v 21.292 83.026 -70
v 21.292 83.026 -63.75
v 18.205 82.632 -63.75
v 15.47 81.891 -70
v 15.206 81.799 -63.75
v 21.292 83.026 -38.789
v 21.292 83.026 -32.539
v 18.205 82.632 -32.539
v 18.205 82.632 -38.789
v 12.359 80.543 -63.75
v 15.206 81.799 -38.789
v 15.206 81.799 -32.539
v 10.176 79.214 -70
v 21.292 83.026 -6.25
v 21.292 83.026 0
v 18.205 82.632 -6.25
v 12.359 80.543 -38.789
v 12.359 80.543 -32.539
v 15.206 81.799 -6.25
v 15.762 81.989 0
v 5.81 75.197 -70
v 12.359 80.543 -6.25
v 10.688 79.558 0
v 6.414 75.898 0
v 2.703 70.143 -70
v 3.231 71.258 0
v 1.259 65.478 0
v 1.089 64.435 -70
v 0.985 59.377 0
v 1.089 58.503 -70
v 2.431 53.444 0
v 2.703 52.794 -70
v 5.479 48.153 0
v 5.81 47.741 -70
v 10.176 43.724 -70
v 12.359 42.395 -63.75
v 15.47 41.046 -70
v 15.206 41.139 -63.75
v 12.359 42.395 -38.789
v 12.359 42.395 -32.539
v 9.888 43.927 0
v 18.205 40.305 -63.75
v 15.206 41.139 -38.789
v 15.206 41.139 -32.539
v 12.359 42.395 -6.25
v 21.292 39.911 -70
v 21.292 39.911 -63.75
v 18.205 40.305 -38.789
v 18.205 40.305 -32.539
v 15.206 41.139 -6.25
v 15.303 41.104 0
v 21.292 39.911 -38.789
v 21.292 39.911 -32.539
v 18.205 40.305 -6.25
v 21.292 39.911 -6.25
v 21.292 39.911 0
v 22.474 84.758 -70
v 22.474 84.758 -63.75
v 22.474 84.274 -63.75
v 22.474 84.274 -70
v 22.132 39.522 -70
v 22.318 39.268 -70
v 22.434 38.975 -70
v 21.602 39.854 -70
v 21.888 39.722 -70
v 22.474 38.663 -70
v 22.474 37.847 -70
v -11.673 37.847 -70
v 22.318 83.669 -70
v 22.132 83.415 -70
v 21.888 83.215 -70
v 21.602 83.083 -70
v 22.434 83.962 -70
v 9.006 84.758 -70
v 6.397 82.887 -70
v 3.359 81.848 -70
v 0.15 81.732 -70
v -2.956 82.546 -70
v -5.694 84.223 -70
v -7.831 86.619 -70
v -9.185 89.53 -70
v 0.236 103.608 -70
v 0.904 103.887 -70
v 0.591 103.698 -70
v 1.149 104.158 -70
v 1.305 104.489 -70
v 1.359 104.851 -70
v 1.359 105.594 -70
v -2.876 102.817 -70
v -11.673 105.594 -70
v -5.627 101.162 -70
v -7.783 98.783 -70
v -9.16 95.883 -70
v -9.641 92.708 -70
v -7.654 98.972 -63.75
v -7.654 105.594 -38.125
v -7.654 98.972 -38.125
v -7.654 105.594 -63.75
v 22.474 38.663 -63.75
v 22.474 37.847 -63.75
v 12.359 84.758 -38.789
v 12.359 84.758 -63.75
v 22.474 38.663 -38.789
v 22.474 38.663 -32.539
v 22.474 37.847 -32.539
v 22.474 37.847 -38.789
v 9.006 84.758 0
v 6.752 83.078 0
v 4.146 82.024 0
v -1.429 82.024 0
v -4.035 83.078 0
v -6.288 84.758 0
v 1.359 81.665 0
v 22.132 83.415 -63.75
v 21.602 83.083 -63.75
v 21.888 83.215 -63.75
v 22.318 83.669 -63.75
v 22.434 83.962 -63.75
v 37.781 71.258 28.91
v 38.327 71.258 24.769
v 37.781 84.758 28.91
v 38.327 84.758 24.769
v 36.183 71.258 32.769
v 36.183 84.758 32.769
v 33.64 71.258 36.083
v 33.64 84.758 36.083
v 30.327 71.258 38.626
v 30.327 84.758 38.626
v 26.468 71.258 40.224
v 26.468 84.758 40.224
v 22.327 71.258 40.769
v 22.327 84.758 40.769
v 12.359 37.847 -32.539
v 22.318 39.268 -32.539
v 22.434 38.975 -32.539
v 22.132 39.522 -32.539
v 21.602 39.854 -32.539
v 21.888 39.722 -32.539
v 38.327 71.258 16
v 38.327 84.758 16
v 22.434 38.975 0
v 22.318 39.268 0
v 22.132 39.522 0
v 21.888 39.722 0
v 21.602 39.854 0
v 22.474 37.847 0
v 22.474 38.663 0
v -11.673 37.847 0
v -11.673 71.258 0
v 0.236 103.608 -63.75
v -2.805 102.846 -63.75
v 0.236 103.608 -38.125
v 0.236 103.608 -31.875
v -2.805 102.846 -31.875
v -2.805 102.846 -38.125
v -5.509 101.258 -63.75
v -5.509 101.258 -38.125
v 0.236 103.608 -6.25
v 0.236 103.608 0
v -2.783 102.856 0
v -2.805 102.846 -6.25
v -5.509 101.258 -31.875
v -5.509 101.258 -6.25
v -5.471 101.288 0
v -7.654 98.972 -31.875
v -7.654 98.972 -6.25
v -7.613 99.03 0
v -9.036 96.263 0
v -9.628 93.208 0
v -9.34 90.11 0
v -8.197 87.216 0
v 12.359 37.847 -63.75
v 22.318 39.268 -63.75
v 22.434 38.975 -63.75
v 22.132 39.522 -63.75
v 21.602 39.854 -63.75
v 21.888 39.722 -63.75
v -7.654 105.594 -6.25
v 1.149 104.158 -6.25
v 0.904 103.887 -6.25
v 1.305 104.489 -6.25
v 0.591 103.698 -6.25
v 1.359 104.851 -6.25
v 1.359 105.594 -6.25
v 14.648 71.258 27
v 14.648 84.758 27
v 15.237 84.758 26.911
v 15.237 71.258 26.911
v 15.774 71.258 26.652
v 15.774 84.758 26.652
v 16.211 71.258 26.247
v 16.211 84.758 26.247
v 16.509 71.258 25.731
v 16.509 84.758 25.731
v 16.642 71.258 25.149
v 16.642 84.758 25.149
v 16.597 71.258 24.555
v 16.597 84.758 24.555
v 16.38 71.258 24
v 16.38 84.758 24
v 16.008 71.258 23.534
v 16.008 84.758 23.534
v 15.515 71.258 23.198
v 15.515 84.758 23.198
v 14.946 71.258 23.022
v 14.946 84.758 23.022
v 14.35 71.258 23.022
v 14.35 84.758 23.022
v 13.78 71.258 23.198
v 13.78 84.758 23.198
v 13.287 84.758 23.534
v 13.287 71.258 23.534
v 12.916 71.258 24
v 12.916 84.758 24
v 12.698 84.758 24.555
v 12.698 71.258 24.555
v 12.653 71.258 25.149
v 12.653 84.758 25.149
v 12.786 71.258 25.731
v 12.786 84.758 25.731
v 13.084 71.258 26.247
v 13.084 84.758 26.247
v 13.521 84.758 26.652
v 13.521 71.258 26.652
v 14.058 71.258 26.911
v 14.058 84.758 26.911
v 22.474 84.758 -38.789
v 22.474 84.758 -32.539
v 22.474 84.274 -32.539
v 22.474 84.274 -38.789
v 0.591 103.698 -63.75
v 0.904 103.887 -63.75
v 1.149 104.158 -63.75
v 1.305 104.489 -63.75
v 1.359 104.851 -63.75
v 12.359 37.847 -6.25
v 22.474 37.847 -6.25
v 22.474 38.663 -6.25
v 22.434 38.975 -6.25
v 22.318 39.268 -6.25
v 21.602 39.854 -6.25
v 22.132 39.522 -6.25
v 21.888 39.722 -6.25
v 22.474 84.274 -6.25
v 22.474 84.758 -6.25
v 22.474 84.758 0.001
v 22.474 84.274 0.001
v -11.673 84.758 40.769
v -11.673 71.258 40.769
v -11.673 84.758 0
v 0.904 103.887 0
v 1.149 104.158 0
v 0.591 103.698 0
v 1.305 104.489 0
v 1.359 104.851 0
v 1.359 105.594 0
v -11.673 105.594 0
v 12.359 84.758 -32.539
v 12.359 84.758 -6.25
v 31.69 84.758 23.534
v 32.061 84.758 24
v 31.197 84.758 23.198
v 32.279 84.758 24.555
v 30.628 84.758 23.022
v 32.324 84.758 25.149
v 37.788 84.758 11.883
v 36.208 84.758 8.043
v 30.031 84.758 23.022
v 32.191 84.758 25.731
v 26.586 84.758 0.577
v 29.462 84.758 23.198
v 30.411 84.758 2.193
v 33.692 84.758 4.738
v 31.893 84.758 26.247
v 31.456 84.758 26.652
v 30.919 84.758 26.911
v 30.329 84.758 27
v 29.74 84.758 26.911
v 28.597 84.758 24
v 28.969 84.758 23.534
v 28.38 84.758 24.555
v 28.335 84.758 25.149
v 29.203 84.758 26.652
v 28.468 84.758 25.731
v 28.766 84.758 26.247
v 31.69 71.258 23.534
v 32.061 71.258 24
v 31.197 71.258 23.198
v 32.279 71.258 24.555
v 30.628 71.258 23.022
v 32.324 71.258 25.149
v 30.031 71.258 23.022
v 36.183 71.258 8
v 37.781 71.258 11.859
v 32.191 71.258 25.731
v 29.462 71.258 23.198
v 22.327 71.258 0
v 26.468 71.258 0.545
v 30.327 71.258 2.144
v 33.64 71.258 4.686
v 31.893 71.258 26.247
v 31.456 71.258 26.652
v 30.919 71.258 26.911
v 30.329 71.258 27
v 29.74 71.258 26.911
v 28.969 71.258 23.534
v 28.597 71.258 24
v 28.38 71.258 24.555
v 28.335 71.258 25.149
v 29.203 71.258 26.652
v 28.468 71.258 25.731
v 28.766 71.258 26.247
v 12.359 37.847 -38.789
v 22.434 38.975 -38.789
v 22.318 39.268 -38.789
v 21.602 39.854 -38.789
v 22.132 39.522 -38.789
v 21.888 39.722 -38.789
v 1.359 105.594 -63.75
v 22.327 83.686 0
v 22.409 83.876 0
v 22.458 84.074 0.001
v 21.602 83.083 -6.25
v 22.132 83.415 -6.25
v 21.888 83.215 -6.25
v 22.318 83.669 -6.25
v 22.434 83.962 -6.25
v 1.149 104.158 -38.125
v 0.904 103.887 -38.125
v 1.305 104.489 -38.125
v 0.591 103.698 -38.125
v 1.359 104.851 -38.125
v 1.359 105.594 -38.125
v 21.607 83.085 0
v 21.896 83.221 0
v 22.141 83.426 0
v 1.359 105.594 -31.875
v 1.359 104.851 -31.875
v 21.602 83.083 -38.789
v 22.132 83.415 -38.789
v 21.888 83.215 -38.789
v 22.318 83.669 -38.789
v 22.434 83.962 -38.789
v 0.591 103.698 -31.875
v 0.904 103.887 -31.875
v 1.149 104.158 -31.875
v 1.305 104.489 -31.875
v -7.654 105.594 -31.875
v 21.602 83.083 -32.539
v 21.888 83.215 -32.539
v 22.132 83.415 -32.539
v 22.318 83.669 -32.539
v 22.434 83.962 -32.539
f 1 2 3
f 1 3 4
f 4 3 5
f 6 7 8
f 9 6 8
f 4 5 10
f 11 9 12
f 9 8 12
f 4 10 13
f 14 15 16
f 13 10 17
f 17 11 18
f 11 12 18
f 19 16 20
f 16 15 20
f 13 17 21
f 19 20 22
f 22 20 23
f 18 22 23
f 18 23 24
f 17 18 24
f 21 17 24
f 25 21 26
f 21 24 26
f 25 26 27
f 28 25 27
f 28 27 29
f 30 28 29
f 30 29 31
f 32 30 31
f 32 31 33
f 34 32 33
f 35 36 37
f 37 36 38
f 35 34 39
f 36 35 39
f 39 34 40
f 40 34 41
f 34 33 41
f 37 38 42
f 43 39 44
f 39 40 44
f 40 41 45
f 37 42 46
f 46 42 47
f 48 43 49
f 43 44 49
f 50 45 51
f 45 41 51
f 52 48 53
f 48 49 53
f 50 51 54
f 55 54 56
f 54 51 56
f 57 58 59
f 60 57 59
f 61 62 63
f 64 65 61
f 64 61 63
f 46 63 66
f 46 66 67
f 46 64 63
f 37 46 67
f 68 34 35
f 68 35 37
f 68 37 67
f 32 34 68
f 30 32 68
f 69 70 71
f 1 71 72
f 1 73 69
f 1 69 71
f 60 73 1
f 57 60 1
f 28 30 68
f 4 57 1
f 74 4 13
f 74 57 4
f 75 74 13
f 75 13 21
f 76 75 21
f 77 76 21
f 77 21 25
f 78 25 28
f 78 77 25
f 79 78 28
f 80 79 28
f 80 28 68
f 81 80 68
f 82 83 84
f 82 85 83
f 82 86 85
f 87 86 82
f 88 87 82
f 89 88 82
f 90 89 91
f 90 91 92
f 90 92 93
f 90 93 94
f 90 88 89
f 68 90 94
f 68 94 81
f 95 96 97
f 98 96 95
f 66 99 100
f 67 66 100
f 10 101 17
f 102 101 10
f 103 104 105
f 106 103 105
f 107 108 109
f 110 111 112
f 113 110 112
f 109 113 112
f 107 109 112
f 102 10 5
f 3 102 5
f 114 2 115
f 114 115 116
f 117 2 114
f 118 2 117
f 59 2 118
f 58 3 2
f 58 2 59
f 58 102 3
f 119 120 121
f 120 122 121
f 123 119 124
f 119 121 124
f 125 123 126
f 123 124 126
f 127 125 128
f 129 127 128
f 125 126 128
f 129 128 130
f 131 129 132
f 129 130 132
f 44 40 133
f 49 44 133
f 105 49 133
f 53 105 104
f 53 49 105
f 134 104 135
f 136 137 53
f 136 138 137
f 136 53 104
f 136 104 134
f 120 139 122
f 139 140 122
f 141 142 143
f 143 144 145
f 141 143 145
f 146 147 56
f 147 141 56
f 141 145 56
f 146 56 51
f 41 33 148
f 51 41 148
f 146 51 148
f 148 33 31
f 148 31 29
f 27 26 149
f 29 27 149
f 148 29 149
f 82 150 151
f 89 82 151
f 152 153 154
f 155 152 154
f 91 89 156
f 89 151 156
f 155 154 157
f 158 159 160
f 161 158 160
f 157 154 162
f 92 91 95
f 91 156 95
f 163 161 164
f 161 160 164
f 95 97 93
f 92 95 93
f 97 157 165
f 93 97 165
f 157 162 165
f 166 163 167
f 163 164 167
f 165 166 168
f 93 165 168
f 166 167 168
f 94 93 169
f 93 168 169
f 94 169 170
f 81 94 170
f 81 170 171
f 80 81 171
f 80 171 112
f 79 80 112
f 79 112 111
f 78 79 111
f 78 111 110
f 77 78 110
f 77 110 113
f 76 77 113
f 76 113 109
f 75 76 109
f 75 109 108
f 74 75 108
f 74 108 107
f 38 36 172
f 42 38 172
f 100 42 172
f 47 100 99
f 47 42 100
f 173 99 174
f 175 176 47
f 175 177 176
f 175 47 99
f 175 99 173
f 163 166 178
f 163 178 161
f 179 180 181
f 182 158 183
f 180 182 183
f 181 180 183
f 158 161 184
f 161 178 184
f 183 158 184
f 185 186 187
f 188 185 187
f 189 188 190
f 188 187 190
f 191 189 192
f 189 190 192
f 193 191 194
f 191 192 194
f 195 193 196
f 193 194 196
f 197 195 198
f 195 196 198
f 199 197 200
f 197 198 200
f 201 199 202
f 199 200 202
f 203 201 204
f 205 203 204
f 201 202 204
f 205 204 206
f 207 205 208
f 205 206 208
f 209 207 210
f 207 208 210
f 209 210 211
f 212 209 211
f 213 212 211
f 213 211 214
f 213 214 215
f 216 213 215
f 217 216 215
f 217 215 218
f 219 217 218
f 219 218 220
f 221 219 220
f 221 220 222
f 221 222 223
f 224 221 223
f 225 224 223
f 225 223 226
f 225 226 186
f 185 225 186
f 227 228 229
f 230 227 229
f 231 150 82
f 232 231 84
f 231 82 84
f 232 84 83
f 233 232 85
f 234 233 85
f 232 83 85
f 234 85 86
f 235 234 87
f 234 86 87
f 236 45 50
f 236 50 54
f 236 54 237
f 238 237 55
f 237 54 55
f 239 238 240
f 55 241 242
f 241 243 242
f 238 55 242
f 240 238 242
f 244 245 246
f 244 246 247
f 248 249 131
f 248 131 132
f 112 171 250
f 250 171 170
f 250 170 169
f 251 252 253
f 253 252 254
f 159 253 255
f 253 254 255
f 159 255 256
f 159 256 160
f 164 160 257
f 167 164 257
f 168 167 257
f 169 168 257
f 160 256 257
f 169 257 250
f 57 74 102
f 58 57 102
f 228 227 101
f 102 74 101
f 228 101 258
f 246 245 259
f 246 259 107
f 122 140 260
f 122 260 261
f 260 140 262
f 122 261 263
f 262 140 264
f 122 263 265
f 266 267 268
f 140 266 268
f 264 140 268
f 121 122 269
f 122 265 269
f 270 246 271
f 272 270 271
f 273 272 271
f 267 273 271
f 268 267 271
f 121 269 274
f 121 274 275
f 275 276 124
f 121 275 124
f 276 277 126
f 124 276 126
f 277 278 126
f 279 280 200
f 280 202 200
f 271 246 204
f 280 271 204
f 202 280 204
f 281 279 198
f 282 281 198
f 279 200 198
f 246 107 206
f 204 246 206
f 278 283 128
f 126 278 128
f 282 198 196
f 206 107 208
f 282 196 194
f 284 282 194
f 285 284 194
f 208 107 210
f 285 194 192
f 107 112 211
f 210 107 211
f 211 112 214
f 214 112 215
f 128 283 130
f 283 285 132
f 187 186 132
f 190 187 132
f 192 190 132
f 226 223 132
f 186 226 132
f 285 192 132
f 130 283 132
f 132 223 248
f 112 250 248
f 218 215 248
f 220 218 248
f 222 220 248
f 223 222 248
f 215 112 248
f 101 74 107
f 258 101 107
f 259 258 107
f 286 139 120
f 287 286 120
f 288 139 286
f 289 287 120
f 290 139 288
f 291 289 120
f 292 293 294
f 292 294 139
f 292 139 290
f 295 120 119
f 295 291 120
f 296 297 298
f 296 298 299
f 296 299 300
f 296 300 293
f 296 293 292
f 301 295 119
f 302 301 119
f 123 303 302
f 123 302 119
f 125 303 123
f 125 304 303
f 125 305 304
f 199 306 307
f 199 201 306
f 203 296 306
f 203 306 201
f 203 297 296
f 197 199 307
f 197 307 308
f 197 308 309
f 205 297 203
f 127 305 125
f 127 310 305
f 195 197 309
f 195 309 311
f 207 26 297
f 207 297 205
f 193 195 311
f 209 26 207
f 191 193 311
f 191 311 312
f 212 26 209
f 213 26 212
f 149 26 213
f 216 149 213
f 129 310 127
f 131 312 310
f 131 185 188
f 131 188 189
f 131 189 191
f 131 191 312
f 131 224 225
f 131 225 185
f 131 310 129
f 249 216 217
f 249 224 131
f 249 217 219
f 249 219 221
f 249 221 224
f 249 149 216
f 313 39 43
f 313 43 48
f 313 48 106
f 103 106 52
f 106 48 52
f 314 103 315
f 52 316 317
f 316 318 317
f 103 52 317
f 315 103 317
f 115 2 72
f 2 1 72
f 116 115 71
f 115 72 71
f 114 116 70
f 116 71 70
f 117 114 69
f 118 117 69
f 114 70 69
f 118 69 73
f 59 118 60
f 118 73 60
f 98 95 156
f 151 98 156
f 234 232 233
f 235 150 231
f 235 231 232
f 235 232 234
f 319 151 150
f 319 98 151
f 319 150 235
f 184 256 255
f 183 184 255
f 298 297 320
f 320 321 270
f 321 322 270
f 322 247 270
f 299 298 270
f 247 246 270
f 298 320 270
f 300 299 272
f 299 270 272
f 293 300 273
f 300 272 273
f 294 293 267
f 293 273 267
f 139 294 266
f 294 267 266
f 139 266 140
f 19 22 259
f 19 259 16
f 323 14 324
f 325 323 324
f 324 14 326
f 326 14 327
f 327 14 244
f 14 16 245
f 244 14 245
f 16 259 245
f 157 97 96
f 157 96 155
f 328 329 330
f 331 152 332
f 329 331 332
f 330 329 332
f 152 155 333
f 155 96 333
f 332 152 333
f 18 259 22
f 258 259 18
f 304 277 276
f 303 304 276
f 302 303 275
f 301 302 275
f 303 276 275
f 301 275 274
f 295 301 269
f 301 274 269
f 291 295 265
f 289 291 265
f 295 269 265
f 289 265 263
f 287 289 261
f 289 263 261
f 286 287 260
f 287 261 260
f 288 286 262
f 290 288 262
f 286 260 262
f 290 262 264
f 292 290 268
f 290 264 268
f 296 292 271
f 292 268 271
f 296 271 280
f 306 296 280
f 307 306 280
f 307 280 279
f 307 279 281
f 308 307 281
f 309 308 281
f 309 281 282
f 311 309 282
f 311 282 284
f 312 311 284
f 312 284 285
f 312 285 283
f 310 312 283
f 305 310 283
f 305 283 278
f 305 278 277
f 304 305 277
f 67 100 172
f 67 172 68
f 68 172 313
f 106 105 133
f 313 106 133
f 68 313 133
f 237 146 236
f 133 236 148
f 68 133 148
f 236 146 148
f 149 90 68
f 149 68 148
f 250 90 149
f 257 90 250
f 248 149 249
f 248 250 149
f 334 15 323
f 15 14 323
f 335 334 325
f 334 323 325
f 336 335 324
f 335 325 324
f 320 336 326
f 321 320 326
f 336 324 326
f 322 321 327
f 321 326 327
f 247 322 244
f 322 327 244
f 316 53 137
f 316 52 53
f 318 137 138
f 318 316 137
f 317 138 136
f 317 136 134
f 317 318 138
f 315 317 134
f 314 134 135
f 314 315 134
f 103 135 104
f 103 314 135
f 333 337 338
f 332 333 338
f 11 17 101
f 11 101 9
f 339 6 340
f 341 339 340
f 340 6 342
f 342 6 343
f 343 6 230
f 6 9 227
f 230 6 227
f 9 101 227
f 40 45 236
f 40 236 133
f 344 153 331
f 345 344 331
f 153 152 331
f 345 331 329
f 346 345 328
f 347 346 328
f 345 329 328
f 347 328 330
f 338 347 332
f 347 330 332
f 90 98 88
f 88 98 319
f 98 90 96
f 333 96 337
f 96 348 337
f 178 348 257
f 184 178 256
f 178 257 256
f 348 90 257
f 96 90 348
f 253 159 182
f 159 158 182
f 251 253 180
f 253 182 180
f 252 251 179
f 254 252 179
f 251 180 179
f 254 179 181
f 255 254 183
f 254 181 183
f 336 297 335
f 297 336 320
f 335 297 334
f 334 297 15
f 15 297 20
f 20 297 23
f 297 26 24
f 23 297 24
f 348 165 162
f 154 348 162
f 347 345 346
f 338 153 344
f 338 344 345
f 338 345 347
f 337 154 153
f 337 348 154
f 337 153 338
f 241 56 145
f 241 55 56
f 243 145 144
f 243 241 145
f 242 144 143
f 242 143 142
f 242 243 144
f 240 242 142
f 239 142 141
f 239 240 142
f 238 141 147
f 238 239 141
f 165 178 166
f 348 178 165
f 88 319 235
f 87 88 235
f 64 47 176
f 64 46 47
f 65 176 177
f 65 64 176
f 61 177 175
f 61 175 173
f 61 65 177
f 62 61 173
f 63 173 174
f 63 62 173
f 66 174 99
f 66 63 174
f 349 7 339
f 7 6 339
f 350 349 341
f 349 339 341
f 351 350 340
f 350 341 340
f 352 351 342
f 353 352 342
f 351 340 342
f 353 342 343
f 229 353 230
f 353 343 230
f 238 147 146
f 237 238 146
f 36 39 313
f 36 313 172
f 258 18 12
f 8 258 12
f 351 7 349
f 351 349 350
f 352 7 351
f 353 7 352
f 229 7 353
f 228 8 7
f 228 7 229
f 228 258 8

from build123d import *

# Parameters (mm, degrees)
BOSS_EXTRUDE1_DEPTH = 70
SKETCH2_W           = 30.127897987
SKETCH2_H           = 25.625
CUT_EXTRUDE1_DEPTH  = 10
SKETCH3_W           = 36.135462637
SKETCH3_H           = 24.960917338
SKETCH3_H_2         = 26.289082662
CUT_EXTRUDE2_DEPTH  = 88.210896549
SKETCH5_W           = 40.769231001
SKETCH5_H           = 13.5
BOSS_EXTRUDE2_DEPTH = 50
SKETCH6_R           = 2
CUT_EXTRUDE3_DEPTH  = 50
FILLET1_R           = 1.25
FILLET2_R           = 16


with BuildPart() as part:
    # Sketch1 → Boss-Extrude1 (new body)
    with BuildSketch(Plane.XY):
        with BuildLine():
            Line((22.473811518, 84.75800041), (22.473811518, 83.058719541))
            ThreePointArc((22.473811518, 83.058719541), (0.883811518, 61.468719541), (22.473811518, 39.878719541))
            Line((22.473811518, 39.878719541), (22.473811518, 37.846719541))
            Line((22.473811518, 37.846719541), (-11.673355367, 37.846719541))
            Line((-11.673355367, 37.846719541), (-11.673355367, 105.594024014))
            Line((-11.673355367, 105.594024014), (1.358644633, 105.594024014))
            Line((1.358644633, 105.594024014), (1.358644633, 103.665116534))
            ThreePointArc((1.358644633, 103.665116534), (-8.83886186, 88.540693991), (9.005703845, 84.75800041))
            Line((9.005703845, 84.75800041), (22.473811518, 84.75800041))
        make_face()
    extrude(amount=-BOSS_EXTRUDE1_DEPTH)

    # Sketch2 → Cut-Extrude1 (cut)
    with BuildSketch(Plane(origin=(0, 105.594024014, 0), x_dir=(1, 0, 0), z_dir=(0, 1, 0))):
        with Locations((7.409862525, 50.9375)):
            Rectangle(SKETCH2_W, SKETCH2_H)
        with Locations((7.409862525, 19.0625)):
            Rectangle(SKETCH2_W, SKETCH2_H)
    extrude(amount=-CUT_EXTRUDE1_DEPTH, mode=Mode.SUBTRACT)

    # Sketch3 → Cut-Extrude2 (cut, through all)
    with BuildSketch(Plane(origin=(0, 84.75800041, 0), x_dir=(1, 0, 0), z_dir=(0, 1, 0))):
        with Locations((30.426375951, 51.269541331)):
            Rectangle(SKETCH3_W, SKETCH3_H)
        with Locations((30.426375951, 19.394541331)):
            Rectangle(SKETCH3_W, SKETCH3_H_2)
    extrude(amount=-CUT_EXTRUDE2_DEPTH, mode=Mode.SUBTRACT)

    # Sketch5 → Boss-Extrude2 (add)
    with BuildSketch(Plane.ZY.offset(11.673355367)):
        with Locations((20.384615501, 78.00800041)):
            Rectangle(SKETCH5_W, SKETCH5_H)
    extrude(amount=-BOSS_EXTRUDE2_DEPTH)

    # Sketch6 → Cut-Extrude3 (cut)
    with BuildSketch(Plane(origin=(0, 84.75800041, 0), x_dir=(1, 0, 0), z_dir=(0, 1, 0))):
        with Locations(Location((14.647627353, -25, 0), (0, 0, 270))):
            Circle(SKETCH6_R)
        with Locations(Location((30.329421103, -25, 0), (0, 0, 270))):
            Circle(SKETCH6_R)
    extrude(amount=-CUT_EXTRUDE3_DEPTH, mode=Mode.SUBTRACT)

    # Fillet1
    fillet1_edges = [part.edges().sort_by_distance(p)[0] for p in [
        (1.358644633, 103.665116534, -66.875),
        (22.473811518, 83.058719541, -66.875),
        (22.473811518, 39.878719541, -66.875),
        (1.358644633, 103.665116534, -35),
        (1.358644633, 103.665116534, -3.125),
        (22.473811518, 39.878719541, -35.664082662),
        (22.473811518, 39.878719541, -3.125),
        (22.473811518, 83.058719541, -35.664082662),
        (22.473811518, 83.058719541, -3.125),
    ]]
    fillet(fillet1_edges, radius=FILLET1_R)

    # Fillet2
    fillet2_edges = [part.edges().sort_by_distance(p)[0] for p in [
        (38.326644633, 78.00800041, 0),
        (38.326644633, 78.00800041, 40.769231001),
    ]]
    fillet(fillet2_edges, radius=FILLET2_R)


solid = part.part
